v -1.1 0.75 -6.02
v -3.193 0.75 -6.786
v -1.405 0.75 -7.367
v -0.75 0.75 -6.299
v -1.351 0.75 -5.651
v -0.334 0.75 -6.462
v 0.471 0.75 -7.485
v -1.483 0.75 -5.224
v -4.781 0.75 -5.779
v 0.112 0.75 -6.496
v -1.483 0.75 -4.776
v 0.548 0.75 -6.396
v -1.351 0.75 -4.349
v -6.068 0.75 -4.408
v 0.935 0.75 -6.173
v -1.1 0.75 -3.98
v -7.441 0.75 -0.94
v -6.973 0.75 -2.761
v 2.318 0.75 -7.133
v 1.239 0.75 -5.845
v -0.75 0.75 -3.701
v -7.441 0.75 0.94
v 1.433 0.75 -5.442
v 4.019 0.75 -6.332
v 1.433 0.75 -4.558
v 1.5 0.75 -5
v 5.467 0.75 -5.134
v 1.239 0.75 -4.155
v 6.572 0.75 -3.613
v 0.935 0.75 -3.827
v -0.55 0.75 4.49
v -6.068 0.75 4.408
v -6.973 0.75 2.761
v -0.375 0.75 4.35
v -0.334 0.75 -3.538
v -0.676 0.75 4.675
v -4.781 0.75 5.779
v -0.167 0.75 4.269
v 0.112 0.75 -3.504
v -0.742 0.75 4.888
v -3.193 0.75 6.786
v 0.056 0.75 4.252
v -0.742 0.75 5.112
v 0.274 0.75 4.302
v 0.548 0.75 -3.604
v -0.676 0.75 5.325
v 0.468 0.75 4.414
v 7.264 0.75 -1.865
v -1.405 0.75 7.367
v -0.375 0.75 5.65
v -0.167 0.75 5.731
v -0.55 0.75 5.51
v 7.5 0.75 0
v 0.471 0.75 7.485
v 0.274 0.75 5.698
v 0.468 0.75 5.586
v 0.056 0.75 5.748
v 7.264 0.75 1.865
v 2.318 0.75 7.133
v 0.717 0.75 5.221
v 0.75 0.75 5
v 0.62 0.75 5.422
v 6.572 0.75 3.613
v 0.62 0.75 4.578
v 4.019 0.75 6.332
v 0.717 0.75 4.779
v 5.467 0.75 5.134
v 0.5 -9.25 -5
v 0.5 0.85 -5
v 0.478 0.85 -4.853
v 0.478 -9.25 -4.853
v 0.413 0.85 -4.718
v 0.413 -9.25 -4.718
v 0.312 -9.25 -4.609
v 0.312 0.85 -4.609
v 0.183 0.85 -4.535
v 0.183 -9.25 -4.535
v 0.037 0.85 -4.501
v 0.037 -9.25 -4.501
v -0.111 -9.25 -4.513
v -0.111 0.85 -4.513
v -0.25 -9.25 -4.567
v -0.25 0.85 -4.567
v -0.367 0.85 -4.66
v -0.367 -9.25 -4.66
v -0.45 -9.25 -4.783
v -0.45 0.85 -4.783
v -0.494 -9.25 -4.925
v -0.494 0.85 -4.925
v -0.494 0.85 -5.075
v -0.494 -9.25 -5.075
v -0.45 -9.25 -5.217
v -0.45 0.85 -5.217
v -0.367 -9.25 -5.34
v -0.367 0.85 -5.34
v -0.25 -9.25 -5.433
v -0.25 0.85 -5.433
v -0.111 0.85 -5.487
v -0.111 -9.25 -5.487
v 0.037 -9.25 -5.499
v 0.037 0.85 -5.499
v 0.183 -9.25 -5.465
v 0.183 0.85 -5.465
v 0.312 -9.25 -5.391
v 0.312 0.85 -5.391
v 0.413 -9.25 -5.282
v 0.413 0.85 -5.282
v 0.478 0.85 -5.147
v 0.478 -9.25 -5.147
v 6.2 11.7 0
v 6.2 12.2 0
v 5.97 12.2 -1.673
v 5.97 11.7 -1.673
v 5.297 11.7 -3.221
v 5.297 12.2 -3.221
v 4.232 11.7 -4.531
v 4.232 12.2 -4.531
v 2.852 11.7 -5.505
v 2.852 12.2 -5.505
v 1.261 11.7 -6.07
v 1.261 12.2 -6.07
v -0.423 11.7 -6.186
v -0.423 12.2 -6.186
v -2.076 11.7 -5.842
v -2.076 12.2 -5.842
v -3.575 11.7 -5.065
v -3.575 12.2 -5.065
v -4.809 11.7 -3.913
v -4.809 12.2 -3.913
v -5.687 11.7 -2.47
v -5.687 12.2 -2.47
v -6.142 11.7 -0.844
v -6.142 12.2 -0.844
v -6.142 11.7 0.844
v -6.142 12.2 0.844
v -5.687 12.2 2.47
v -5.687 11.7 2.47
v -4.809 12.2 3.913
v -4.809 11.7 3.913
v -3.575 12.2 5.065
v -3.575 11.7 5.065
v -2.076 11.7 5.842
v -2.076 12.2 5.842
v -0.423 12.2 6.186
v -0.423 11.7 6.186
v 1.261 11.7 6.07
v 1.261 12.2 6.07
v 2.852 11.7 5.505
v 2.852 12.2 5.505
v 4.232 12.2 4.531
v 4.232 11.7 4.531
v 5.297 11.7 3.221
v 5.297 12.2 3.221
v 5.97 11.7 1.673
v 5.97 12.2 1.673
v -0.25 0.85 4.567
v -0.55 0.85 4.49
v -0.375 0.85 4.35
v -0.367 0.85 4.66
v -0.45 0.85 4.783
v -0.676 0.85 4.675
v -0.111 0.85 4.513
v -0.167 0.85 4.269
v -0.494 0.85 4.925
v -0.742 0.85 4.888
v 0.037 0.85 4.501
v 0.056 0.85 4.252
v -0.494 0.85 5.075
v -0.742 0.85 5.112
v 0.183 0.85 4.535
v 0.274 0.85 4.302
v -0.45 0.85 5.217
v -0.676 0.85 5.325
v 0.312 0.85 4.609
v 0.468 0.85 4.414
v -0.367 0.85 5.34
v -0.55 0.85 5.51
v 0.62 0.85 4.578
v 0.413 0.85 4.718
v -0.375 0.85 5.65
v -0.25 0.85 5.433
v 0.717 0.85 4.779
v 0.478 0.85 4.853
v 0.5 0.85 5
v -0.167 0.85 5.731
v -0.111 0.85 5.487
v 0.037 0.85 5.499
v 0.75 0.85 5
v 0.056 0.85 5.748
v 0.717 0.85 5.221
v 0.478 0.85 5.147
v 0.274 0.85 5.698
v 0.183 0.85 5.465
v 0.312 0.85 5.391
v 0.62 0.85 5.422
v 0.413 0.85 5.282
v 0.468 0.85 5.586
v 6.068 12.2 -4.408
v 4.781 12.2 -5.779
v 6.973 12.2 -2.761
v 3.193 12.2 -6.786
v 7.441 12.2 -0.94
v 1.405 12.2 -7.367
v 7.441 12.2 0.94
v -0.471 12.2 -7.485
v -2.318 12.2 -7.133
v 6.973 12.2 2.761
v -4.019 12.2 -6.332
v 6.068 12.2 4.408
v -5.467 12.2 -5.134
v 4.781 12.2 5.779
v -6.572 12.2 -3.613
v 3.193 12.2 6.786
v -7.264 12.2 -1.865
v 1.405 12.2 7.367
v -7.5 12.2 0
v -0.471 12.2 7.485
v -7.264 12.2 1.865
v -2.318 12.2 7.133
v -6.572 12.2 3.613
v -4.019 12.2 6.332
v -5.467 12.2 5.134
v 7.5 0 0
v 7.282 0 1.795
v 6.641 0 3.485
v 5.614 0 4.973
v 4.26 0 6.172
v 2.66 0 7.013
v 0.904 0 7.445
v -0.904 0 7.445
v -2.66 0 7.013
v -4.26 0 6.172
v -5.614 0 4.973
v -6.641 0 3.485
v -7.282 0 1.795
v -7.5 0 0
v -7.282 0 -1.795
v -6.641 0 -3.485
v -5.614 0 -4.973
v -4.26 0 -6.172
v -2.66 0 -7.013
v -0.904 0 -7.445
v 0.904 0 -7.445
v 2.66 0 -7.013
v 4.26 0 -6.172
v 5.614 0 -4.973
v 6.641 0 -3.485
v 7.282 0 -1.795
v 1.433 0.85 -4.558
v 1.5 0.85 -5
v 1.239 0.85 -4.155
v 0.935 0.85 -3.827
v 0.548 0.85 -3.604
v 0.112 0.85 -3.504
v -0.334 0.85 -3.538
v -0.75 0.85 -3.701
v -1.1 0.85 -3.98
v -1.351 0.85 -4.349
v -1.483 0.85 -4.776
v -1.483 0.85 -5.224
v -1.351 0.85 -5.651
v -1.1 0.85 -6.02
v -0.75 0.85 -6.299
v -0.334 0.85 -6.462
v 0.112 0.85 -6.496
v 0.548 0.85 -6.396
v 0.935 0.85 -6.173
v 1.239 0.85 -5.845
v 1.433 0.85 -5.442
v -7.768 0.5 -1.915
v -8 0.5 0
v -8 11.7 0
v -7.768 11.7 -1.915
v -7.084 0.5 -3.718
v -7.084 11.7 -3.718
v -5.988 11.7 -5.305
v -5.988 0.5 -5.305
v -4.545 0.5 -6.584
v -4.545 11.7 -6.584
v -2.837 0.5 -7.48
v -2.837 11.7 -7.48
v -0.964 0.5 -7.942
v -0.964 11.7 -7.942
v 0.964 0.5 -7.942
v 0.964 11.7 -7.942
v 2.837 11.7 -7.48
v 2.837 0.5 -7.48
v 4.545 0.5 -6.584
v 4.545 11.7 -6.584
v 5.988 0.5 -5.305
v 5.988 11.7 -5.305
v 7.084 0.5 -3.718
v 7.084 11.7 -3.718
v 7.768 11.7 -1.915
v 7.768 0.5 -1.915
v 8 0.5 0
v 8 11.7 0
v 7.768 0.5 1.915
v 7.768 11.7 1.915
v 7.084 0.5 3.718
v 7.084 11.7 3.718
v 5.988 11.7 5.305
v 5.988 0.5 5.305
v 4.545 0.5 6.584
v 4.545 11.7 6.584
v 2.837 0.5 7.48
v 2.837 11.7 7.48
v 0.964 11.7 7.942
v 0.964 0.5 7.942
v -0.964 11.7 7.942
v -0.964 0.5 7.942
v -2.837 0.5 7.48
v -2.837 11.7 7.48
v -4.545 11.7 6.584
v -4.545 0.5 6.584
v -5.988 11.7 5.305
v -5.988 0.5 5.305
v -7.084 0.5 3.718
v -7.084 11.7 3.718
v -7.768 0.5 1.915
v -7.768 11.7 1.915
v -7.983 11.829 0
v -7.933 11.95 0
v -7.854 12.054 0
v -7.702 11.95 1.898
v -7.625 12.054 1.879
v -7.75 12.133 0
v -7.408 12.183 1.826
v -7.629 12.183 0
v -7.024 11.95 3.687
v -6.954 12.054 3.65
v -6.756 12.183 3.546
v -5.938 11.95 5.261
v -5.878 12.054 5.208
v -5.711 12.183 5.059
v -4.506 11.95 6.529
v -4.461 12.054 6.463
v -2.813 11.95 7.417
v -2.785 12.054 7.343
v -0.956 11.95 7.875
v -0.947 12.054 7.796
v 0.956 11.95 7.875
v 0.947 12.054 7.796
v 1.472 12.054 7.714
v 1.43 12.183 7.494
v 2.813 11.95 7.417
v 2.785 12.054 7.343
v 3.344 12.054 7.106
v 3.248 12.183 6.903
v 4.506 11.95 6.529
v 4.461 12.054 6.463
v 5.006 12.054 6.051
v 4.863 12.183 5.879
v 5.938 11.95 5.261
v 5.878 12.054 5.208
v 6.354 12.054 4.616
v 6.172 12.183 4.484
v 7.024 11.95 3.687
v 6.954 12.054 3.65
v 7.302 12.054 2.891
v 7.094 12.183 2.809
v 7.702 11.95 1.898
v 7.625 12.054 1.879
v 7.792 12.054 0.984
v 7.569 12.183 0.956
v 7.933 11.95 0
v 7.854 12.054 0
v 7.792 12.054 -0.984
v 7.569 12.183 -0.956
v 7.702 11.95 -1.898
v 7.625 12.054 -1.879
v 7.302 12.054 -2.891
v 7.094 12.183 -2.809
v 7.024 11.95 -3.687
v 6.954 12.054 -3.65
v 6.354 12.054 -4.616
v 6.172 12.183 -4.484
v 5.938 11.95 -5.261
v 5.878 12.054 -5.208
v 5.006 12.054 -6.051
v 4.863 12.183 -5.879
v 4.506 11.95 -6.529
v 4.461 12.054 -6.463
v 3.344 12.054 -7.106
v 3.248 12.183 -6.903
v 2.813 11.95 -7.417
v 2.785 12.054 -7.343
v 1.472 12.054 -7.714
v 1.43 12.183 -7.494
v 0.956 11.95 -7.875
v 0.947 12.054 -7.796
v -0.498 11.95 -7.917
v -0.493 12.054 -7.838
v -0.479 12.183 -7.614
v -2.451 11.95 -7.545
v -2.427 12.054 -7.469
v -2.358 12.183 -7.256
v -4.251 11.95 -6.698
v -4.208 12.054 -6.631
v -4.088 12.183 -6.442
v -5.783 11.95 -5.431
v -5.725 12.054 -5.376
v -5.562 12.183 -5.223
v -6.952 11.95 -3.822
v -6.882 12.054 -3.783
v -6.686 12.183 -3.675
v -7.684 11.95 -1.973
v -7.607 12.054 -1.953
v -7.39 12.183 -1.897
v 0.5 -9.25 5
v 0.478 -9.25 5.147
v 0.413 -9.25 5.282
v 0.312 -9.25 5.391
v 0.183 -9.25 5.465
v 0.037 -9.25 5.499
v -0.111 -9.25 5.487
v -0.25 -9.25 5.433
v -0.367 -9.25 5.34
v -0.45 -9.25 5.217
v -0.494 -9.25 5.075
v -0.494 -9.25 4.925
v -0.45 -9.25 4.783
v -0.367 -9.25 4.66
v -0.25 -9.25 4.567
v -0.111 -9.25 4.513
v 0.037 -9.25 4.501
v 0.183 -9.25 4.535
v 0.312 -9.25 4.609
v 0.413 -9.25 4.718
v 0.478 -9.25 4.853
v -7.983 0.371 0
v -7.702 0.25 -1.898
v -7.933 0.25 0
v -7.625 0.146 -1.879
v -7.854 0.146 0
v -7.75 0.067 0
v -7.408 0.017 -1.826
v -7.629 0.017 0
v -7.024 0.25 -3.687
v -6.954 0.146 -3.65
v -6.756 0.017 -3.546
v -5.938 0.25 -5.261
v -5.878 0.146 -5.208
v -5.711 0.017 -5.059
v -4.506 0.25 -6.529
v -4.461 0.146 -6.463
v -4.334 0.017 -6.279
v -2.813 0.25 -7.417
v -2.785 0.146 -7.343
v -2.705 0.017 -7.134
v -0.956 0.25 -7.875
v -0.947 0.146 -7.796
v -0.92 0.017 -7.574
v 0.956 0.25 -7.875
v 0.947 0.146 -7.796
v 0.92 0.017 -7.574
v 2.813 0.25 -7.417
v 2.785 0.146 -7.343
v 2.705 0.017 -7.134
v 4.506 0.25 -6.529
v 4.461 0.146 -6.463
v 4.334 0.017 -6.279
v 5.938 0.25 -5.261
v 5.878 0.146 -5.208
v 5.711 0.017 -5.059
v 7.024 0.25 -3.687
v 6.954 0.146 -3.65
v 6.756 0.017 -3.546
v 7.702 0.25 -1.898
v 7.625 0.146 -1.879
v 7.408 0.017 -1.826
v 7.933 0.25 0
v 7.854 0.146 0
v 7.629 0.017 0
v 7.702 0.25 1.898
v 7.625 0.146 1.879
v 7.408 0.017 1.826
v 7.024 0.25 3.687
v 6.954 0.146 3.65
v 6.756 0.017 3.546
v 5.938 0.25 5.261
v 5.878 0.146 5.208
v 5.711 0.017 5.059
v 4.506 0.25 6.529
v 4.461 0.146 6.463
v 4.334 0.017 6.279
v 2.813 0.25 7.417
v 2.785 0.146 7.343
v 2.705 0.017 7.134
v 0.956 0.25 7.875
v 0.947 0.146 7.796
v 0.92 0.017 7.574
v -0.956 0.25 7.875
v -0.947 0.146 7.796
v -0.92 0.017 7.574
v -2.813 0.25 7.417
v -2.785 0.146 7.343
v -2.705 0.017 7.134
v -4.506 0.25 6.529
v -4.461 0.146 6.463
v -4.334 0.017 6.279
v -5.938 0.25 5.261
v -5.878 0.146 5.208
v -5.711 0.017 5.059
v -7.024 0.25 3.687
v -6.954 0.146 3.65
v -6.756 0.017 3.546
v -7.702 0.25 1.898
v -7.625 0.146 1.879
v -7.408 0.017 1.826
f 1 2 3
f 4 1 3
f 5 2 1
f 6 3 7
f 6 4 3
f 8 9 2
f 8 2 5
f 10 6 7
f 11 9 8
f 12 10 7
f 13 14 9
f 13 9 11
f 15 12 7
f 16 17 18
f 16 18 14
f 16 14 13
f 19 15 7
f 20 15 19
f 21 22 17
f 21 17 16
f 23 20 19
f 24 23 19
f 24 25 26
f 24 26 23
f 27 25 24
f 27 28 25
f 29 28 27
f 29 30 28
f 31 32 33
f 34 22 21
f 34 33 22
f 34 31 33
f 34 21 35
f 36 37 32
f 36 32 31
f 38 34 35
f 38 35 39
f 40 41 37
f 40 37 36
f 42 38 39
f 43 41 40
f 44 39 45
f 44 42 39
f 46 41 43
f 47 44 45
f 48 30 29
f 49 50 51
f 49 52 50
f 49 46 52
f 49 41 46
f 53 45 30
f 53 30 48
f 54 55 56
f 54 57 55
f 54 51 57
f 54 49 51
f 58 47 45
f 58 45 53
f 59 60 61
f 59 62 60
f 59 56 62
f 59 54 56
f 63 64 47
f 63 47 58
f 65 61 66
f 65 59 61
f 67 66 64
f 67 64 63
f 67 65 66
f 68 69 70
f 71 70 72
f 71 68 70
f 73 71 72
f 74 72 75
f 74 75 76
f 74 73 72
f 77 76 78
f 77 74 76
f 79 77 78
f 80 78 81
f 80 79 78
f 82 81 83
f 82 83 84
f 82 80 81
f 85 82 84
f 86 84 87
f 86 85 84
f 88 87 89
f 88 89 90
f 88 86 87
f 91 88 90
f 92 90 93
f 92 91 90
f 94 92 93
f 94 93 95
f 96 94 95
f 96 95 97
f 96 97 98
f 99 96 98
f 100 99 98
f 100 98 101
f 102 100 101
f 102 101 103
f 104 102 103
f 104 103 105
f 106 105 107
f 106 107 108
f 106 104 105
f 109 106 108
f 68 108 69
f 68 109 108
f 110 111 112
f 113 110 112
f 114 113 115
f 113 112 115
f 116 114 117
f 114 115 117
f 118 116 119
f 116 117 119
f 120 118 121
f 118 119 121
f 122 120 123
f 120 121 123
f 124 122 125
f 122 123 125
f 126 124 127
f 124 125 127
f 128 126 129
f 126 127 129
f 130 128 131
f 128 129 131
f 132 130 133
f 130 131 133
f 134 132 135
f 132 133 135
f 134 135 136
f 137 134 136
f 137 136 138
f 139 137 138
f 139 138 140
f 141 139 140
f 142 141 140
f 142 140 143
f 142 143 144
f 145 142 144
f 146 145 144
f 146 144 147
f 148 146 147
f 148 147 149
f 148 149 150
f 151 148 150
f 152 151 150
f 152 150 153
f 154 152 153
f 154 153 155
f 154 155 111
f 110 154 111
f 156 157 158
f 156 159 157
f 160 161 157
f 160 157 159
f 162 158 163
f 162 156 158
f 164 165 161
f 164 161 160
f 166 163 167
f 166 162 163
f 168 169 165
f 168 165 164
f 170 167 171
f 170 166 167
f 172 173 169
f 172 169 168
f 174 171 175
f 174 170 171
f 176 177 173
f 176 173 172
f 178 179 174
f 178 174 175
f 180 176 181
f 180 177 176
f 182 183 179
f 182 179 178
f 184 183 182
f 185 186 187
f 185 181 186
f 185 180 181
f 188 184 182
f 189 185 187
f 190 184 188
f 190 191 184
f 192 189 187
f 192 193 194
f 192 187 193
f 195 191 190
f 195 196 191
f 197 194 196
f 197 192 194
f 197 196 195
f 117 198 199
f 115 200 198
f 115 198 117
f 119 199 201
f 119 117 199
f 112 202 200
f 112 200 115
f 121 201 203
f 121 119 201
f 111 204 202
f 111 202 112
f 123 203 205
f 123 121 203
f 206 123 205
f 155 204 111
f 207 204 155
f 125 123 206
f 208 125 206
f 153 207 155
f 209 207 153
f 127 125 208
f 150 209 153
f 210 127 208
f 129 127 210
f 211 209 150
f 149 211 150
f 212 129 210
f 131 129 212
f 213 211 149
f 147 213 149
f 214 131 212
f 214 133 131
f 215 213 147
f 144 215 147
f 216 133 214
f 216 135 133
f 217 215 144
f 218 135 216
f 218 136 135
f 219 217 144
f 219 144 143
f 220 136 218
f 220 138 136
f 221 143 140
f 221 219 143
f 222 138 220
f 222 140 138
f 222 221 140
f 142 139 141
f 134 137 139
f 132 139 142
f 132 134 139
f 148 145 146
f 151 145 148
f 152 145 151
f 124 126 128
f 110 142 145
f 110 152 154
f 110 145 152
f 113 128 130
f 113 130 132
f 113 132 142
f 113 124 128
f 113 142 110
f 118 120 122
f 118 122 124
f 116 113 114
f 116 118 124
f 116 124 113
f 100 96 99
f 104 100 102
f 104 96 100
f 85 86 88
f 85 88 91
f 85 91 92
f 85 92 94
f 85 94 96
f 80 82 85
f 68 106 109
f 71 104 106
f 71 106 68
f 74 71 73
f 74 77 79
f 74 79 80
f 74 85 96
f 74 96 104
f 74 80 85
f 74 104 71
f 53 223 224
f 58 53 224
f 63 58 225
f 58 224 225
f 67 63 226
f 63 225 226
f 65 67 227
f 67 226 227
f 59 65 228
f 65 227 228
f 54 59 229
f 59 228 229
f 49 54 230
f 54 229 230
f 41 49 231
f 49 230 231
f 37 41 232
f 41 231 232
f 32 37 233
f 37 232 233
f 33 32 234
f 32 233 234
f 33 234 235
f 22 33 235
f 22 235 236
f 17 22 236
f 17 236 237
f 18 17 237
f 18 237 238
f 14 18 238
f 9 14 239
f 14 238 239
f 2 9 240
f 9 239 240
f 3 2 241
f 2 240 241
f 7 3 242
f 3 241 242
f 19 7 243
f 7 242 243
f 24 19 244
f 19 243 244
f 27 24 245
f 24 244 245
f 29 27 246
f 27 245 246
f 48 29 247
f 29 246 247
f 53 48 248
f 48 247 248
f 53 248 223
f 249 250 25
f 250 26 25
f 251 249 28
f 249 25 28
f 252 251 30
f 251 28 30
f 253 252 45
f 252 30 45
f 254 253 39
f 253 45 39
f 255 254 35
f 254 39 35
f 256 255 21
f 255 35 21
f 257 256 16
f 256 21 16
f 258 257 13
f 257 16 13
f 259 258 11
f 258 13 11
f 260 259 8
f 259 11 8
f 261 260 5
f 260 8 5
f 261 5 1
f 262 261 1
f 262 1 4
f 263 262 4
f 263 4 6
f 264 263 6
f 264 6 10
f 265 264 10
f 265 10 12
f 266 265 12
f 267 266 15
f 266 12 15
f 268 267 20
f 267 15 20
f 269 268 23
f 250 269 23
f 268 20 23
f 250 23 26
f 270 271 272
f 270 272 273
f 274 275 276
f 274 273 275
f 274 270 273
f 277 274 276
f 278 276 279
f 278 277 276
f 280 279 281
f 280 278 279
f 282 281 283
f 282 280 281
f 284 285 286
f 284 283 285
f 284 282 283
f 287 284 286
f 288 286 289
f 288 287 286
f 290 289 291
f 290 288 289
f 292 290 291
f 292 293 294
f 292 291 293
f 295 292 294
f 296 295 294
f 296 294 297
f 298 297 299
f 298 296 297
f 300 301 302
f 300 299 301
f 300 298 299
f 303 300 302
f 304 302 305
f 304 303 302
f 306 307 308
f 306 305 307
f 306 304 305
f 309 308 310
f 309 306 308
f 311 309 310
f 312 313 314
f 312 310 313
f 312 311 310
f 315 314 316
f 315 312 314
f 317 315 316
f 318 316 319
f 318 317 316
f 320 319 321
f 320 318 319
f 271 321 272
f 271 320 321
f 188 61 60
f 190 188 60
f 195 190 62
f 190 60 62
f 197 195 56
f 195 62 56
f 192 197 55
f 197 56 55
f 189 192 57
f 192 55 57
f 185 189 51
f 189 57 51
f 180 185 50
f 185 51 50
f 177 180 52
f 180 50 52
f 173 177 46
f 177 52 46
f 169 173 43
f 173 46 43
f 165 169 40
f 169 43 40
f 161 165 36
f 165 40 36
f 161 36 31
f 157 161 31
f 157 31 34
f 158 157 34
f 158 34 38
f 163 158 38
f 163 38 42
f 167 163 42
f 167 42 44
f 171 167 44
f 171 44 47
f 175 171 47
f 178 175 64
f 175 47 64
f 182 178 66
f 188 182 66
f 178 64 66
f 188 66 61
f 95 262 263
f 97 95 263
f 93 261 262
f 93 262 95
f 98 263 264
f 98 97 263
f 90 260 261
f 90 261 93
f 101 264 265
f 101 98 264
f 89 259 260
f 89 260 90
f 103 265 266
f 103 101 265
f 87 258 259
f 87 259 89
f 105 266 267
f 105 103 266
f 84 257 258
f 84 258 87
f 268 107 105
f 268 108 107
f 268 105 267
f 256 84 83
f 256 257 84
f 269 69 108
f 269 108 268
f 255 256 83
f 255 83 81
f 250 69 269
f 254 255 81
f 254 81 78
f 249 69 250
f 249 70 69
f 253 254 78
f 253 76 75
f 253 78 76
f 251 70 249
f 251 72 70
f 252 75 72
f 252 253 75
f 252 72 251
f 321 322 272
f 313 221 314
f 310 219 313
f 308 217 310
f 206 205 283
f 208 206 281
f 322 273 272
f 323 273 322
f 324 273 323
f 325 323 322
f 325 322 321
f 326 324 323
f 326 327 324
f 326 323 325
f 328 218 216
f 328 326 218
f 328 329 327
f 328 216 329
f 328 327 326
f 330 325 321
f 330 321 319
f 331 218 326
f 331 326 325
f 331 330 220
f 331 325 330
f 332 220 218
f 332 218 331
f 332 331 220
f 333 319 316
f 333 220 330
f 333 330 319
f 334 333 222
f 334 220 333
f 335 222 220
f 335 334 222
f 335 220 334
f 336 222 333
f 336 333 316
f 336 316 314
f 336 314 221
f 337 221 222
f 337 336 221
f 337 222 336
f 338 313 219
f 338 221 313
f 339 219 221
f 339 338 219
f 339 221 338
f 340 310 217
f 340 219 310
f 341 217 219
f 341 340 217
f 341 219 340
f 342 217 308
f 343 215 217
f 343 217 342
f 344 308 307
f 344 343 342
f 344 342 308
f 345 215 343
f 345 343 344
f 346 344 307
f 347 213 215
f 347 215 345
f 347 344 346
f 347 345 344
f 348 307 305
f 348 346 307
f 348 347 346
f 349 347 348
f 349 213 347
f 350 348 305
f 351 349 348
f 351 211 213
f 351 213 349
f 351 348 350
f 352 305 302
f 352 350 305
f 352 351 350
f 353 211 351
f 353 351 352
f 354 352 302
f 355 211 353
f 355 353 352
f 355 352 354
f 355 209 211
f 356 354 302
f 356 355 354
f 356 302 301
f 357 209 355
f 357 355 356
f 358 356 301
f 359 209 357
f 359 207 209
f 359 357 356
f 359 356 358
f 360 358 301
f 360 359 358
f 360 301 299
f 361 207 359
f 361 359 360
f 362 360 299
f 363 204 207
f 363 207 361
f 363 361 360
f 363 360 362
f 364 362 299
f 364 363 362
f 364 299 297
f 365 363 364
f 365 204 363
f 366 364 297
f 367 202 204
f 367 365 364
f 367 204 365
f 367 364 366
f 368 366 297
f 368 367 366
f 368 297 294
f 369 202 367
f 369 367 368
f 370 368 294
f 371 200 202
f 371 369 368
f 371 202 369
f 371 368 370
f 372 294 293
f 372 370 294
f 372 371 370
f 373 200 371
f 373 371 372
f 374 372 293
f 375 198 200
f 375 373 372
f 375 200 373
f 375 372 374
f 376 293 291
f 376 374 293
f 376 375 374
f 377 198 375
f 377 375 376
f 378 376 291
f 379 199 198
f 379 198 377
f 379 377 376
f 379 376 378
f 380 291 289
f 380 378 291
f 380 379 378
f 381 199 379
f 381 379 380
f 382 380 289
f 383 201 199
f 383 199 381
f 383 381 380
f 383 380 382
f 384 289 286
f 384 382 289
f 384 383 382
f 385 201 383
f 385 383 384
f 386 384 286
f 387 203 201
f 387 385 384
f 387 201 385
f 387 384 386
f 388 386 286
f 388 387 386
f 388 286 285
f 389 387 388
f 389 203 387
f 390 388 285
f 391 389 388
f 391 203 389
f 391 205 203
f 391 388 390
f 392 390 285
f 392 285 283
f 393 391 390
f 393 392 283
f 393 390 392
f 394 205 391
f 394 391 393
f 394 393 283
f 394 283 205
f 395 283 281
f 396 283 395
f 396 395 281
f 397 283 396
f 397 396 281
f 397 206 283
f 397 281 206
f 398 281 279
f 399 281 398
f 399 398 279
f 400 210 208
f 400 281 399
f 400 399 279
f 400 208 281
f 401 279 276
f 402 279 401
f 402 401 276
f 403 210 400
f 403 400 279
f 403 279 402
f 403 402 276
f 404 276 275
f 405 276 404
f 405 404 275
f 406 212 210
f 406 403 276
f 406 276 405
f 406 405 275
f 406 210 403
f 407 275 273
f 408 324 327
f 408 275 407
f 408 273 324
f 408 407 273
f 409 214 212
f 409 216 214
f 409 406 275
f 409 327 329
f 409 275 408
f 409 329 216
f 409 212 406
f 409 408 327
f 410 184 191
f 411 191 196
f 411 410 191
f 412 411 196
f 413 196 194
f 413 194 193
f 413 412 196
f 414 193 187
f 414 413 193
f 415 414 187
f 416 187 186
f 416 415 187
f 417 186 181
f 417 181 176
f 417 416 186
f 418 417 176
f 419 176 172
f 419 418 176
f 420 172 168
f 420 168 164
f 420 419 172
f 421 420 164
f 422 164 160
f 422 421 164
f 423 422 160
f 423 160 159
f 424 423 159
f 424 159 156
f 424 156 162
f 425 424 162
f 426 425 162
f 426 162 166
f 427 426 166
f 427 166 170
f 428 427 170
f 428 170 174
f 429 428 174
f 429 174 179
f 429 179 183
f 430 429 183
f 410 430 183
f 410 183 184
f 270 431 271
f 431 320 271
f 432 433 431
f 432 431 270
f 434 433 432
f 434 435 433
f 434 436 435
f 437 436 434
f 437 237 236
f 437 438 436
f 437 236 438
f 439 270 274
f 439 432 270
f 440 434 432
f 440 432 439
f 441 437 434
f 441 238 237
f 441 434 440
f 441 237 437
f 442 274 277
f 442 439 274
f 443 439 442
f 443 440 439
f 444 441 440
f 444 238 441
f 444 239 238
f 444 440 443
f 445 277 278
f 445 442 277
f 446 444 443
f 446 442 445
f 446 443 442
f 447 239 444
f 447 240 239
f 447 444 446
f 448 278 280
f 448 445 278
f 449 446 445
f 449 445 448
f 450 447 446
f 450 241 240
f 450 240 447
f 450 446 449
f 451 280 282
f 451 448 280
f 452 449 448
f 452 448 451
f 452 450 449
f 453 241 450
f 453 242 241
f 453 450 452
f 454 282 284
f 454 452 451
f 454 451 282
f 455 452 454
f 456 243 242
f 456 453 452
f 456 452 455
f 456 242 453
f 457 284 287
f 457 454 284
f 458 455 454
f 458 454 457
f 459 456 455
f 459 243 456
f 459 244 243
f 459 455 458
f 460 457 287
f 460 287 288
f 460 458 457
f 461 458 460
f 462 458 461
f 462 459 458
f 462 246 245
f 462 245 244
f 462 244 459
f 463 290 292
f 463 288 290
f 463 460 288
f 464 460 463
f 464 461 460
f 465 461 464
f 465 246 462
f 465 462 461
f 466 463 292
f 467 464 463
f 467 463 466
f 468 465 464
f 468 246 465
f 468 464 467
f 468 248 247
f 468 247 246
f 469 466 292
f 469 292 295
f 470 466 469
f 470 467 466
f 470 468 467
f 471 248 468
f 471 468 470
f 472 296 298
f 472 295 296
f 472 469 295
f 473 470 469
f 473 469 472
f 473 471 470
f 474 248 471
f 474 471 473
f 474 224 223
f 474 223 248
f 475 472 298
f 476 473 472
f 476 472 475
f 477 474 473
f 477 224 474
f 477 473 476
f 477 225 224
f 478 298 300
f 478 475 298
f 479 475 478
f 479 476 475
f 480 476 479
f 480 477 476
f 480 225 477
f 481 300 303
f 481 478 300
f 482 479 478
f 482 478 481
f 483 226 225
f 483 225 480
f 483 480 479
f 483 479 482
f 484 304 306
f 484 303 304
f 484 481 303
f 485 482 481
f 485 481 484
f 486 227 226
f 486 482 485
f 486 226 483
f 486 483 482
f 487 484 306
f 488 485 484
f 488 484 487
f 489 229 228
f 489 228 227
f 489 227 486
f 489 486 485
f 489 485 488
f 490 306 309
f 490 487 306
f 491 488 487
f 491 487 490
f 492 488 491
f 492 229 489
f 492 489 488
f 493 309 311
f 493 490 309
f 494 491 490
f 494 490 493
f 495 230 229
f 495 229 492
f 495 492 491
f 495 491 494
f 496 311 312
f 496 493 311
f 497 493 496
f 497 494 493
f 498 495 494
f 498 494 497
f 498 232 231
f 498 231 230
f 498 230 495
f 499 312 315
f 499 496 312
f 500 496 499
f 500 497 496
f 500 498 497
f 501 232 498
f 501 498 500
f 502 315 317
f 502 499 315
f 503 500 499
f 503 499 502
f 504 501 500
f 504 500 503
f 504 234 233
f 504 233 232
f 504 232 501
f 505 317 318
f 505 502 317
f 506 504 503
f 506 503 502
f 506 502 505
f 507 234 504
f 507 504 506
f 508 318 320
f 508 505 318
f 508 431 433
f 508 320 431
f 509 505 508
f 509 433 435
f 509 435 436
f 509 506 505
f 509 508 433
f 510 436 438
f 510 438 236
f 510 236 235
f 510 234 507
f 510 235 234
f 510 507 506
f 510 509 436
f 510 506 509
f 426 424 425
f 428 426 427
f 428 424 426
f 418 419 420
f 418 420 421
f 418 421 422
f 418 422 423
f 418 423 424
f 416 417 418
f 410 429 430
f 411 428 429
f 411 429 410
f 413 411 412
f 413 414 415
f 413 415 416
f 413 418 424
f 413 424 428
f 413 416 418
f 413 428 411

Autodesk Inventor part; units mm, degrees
ref_plane "YZ Plane" through (0, 0, 0) normal (1, 0, 0) x (0, 1, 0)
ref_plane "XZ Plane" through (0, 0, 0) normal (0, 1, 0) x (-1, 0, 0)
ref_plane "XY Plane" through (0, 0, 0) normal (0, 0, 1) x (1, 0, 0)
sketch "Skizze1" plane through (0, 0, 0) normal (0, 1, 0) x (-1, 0, 0)
  circle A0 centre (0, 0) radius 8
  dimension "d0" = 16
extrude "Extrusion1" add sketch "Skizze1" along normal blind 12.2
fillet "Rundung1" radius 0.5 2 edges at (8, 12.2, 0) (8, 0, 0)
sketch "Skizze2" plane through (0, 12.2, 0) normal (0, 1, 0) x (1, 0, 0)
  circle A0 centre (0, 0) radius 6.2
  circle A1 centre (0, 0) radius 8 projected
  dimension "d4" = 1.8
extrude "Extrusion2" cut sketch "Skizze2" against normal blind 0.5 contours A0
sketch "Skizze3" plane through (0, 0, 0) normal (0, -1, 0) x (1, 0, 0)
  circle A0 centre (0, 0) radius 7.5
extrude "Extrusion3" cut sketch "Skizze3" against normal blind 0.75
sketch "Skizze4" plane through (0, 0.75, 0) normal (0, -1, 0) x (1, 0, 0)
  circle A0 centre (0, -5) radius 0.5
  circle A1 centre (0, 5) radius 0.5
  point P0 (0, 0)
  dimension "d9" = 10
  dimension "d10" = 5
  dimension "d11" = 1
  dimension "d12" = 1
extrude "Extrusion4" add sketch "Skizze4" along normal blind 10
sketch "Skizze5" plane through (0, 0.75, 0) normal (0, -1, 0) x (1, 0, 0)
  circle A0 centre (0, -5) radius 0.5
  circle A1 centre (0, -5) radius 1.5
  circle A2 centre (0, 5) radius 0.5
  circle A3 centre (0, 5) radius 0.75
  circle A4 centre (0, 5) radius 0.5 projected
  circle A5 centre (0, -5) radius 0.5 projected
  point P0 (0, 0)
  dimension "d15" = 0
  dimension "d16" = 0
  dimension "d17" = 1
  dimension "d18" = 0.25
extrude "Extrusion5" cut sketch "Skizze5" against normal blind 0.1
equation "\"d10\" = 0.5 * d9"
equation "\"d12\" = d11"
properties part number "Ultraschallwandler16mm"
